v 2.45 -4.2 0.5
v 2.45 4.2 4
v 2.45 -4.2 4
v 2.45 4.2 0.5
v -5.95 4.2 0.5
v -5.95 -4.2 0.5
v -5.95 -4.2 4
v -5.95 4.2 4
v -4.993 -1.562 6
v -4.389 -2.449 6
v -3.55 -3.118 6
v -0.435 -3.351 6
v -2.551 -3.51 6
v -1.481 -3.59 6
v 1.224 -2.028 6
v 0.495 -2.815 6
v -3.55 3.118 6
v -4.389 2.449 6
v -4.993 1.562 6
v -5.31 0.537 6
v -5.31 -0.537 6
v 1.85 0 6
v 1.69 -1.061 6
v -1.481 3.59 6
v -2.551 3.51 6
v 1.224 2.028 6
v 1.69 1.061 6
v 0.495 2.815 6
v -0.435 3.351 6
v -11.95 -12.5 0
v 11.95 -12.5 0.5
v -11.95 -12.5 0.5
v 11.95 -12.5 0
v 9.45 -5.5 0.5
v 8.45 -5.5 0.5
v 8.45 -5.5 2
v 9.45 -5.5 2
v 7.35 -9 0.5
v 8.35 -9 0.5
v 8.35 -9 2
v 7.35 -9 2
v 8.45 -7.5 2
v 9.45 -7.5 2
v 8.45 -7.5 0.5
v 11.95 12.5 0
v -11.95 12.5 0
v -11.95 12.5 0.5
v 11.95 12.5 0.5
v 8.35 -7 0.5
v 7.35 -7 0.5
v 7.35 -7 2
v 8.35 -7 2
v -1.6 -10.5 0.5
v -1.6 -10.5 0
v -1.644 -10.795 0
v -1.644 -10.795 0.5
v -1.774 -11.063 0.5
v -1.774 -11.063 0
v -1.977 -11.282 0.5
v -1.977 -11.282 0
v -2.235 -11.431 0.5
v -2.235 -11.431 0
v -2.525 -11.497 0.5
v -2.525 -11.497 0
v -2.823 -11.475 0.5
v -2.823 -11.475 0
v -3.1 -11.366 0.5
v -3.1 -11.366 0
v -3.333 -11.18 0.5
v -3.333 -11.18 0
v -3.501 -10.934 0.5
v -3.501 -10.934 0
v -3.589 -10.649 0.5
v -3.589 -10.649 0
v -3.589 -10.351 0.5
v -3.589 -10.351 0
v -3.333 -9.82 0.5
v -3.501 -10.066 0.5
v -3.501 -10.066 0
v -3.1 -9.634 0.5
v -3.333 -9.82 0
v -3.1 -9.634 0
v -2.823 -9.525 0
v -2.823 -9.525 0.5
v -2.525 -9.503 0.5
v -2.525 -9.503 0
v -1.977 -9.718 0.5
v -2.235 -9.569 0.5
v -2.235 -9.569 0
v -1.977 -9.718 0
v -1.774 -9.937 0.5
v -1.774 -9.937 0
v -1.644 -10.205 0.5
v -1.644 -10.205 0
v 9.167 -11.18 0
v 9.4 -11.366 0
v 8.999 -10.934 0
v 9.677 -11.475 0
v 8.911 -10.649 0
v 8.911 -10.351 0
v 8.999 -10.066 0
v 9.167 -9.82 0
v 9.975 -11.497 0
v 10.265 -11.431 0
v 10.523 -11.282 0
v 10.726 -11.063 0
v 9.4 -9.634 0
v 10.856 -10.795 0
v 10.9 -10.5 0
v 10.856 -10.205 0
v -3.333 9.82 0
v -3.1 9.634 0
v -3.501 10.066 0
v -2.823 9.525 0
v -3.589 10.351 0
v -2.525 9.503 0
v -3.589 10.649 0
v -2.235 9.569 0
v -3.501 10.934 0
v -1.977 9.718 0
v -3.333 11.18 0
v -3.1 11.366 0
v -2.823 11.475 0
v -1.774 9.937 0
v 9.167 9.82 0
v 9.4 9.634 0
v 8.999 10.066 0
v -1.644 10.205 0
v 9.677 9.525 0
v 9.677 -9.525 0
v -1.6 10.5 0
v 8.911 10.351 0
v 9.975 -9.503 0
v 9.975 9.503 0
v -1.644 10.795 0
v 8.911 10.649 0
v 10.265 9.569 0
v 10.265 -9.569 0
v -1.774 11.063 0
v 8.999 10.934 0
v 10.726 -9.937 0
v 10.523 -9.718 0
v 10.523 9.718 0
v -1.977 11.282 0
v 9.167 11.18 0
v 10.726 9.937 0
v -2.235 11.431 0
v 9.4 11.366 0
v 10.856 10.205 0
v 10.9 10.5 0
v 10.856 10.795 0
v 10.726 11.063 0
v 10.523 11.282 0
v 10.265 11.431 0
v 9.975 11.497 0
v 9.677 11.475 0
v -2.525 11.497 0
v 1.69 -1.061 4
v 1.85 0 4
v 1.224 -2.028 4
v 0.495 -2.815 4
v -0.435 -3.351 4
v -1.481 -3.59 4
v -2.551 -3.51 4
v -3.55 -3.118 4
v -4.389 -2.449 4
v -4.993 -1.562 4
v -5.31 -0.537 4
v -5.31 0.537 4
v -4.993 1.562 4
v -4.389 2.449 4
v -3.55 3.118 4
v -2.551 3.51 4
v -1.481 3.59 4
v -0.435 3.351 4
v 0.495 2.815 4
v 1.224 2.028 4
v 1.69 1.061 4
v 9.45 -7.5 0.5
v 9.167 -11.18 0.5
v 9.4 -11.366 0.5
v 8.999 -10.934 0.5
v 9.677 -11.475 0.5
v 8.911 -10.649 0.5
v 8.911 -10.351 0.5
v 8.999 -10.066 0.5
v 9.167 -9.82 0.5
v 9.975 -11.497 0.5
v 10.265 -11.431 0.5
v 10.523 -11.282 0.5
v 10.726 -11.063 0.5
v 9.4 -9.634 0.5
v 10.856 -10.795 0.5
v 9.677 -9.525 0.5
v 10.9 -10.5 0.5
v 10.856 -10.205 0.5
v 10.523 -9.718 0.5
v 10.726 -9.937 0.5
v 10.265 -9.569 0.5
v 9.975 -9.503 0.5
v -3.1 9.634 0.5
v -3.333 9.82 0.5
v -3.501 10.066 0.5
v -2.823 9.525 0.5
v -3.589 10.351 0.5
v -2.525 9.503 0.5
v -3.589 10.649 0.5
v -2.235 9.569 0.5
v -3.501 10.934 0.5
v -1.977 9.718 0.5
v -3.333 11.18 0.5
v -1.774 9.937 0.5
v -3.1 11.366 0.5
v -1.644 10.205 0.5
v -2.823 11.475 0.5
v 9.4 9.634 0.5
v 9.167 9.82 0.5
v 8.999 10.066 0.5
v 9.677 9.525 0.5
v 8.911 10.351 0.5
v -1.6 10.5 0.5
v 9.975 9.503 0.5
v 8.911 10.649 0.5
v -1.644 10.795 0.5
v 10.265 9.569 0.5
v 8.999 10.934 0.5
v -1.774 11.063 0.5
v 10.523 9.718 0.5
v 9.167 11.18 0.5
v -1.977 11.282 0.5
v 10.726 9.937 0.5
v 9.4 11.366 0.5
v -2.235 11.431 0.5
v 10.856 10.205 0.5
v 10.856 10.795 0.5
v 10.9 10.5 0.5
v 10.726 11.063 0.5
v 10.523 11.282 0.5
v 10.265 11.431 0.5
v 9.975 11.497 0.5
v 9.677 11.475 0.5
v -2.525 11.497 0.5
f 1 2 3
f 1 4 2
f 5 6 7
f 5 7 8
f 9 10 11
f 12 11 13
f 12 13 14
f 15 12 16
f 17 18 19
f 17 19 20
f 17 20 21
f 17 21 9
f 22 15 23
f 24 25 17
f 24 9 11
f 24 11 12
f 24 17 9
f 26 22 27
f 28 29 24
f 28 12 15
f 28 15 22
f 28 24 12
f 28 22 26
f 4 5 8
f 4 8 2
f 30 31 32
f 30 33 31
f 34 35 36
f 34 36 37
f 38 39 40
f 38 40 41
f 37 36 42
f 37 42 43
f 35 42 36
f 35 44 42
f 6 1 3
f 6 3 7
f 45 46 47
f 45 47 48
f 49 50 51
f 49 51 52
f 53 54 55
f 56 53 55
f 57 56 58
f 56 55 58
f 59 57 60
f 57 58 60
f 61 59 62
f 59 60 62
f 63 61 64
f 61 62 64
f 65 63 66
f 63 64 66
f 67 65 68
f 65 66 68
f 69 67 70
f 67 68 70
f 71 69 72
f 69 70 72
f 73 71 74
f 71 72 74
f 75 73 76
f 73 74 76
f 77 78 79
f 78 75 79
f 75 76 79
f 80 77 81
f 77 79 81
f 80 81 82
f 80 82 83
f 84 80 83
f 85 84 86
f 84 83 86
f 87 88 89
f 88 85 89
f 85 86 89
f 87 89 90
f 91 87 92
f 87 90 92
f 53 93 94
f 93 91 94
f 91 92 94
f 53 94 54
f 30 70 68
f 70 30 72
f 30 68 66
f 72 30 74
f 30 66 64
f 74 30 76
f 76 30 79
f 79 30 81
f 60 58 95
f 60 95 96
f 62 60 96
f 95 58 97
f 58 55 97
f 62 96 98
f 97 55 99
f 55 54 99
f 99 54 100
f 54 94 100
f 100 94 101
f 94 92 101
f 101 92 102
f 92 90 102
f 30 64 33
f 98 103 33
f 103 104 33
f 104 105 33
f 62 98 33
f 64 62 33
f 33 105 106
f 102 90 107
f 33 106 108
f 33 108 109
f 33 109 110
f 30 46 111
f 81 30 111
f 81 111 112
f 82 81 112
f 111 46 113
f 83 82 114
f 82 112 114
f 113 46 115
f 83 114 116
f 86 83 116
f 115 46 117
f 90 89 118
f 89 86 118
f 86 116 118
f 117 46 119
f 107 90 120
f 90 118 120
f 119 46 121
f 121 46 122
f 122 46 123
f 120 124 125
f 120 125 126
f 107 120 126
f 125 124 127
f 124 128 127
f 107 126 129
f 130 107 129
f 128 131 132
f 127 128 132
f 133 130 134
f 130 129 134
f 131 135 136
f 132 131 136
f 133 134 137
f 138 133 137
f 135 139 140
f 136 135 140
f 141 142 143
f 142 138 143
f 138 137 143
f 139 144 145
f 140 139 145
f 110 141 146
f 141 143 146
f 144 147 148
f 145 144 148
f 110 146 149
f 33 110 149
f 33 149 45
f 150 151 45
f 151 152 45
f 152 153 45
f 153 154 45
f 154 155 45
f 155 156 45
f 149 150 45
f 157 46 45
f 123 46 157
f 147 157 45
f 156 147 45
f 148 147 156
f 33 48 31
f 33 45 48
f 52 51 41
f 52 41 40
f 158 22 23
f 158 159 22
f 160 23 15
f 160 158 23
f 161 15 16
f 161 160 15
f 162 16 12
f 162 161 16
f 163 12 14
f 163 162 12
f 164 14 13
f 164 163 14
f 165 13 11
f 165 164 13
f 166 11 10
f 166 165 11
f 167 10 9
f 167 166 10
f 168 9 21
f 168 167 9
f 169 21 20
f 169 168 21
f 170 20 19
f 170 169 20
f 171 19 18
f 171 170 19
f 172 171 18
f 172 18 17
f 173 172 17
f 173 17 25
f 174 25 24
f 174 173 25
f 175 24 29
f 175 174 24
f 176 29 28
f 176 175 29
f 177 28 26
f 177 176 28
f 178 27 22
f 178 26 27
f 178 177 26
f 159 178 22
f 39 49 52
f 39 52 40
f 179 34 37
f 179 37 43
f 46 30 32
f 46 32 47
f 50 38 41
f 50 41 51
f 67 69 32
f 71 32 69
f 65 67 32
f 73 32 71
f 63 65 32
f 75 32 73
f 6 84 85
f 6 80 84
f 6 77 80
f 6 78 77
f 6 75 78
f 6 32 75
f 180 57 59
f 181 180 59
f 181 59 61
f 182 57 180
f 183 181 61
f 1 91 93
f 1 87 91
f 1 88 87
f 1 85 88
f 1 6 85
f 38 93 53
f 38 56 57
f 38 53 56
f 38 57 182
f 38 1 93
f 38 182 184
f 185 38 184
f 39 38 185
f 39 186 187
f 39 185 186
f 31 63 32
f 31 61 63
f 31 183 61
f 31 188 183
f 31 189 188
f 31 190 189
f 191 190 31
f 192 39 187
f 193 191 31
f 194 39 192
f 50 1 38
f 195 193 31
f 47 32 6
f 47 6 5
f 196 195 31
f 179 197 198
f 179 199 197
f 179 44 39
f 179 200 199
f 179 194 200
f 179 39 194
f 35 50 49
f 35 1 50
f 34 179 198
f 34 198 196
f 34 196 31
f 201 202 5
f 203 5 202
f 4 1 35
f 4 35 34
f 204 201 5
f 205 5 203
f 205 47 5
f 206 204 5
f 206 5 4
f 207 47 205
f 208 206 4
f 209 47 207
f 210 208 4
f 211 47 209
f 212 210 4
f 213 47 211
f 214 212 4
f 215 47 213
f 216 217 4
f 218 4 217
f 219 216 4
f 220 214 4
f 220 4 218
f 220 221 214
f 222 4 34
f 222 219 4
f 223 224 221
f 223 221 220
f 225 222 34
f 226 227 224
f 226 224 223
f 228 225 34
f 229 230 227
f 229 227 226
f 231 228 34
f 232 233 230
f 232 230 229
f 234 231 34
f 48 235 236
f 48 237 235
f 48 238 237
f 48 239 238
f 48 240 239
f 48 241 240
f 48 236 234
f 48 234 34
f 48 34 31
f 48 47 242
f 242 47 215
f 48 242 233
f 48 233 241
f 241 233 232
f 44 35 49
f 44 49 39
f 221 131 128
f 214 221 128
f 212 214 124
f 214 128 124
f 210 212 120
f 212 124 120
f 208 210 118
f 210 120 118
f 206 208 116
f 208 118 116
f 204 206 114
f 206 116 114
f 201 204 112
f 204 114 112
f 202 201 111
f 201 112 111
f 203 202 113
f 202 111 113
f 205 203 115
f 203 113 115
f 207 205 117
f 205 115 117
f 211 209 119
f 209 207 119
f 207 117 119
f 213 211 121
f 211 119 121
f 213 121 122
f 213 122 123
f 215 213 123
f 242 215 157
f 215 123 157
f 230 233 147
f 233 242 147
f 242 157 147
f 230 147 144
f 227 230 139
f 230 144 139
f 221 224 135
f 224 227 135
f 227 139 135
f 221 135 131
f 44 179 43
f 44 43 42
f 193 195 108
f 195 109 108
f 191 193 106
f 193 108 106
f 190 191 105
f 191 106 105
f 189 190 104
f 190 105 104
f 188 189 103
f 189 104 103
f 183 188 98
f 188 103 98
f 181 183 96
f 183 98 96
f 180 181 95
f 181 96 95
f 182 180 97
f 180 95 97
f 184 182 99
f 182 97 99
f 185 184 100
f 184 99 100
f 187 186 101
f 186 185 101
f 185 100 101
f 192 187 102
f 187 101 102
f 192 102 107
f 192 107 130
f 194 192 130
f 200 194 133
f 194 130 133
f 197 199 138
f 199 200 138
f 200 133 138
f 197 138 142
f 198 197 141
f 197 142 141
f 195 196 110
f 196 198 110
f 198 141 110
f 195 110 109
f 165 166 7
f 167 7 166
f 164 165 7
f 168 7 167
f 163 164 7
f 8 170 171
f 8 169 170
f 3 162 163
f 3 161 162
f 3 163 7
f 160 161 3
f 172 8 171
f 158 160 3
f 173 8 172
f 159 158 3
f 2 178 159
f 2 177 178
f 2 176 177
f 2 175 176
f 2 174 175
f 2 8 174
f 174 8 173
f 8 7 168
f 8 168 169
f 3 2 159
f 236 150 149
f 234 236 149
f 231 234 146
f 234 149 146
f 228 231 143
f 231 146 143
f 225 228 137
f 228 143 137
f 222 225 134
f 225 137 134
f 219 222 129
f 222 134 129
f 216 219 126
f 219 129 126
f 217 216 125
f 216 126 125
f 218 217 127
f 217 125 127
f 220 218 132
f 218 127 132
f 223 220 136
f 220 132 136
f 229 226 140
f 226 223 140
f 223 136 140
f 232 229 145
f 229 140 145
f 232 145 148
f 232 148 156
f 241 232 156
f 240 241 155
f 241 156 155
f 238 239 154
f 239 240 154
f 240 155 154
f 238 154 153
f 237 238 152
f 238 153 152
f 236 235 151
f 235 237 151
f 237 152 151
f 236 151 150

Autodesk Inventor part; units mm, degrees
ref_plane "YZ Plane" through (0, 0, 0) normal (1, 0, 0) x (0, 1, 0)
ref_plane "XZ Plane" through (0, 0, 0) normal (0, 1, 0) x (-1, 0, 0)
ref_plane "XY Plane" through (0, 0, 0) normal (0, 0, 1) x (1, 0, 0)
sketch "Sketch1" plane through (0, 0, 0) normal (0, 0, 1) x (1, 0, 0)
  line L0 (-11.95, 12.5) -> (11.95, 12.5)
  line L1 (11.95, 12.5) -> (11.95, -12.5)
  line L2 (11.95, -12.5) -> (-11.95, -12.5)
  line L3 (-11.95, -12.5) -> (-11.95, 12.5)
  line L4 (-11.95, 12.5) -> (11.95, -12.5) construction
  line L5 (11.95, 12.5) -> (-11.95, -12.5) construction
  circle A0 centre (9.9, -10.5) radius 1
  circle A1 centre (-2.6, -10.5) radius 1
  line L6 (11.5332, -10.5) -> (-16.0268, -10.5) construction
  line L7 (9.9, -13.3661) -> (9.9, 11.2852) construction
  line L8 (11.2708, 10.5) -> (-4.8598, 10.5) construction
  circle A2 centre (9.9, 10.5) radius 1
  line L9 (-2.6, -15.3332) -> (-2.6, 11.9823) construction
  circle A3 centre (-2.6, 10.5) radius 1
  point P0 (0, 0)
  dimension "d0" = 23.9
  dimension "d1" = 25
  dimension "d2" = 2
  dimension "d3" = 21.85
  dimension "d5" = 2
  dimension "d6" = 9.35
  dimension "d7" = 2
  dimension "d8" = 23
  dimension "d9" = 2
  dimension "d10" = 2
extrude "Extrusion1" add sketch "Sketch1" along normal blind 0.5
sketch "Sketch2" plane through (0, 0, 0.5) normal (0, 0, 1) x (1, 0, 0)
  line L0 (-16.73, 0) -> (16.73, 0) construction
  line L1 (-5.95, 4.2) -> (2.45, 4.2)
  line L2 (2.45, 4.2) -> (2.45, -4.2)
  line L3 (2.45, -4.2) -> (-5.95, -4.2)
  line L4 (-5.95, -4.2) -> (-5.95, 4.2)
  line L5 (-5.95, 4.2) -> (2.45, -4.2) construction
  line L6 (2.45, 4.2) -> (-5.95, -4.2) construction
  line L7 (-11.95, 12.5) -> (-11.95, -12.5) projected
  point P0 (0, 0)
  point P1 (-1.75, 0)
  dimension "d13" = 8.4
  dimension "d14" = 8.4
  dimension "d15" = 6
extrude "Extrusion2" add sketch "Sketch2" along normal blind 3.5
sketch "Sketch3" plane through (0, 0, 4) normal (0, 0, 1) x (1, 0, 0)
  line L0 (-5.95, 4.2) -> (2.45, 4.2) construction
  line L1 (-5.95, 4.2) -> (2.45, -4.2) construction
  line L2 (-5.95, -4.2) -> (2.45, -4.2) construction
  line L3 (2.45, 4.2) -> (-5.95, -4.2) construction
  circle A0 centre (-1.75, 0) radius 3.6
  point P0 (0, 0)
  dimension "d18" = 7.2
extrude "Extrusion3" add sketch "Sketch3" along normal blind 2
sketch "Sketch4" plane through (0, 0, 0.5) normal (0, 0, 1) x (1, 0, 0)
  line L0 (7.35, -7) -> (8.35, -7)
  line L1 (8.35, -7) -> (8.35, -9)
  line L2 (8.35, -9) -> (7.35, -9)
  line L3 (7.35, -9) -> (7.35, -7)
  line L4 (8.45, -5.5) -> (9.45, -5.5)
  line L5 (9.45, -5.5) -> (9.45, -7.5)
  line L6 (9.45, -7.5) -> (8.45, -7.5)
  line L7 (8.45, -7.5) -> (8.45, -5.5)
  line L8 (-11.95, -12.5) -> (11.95, -12.5) projected
  line L9 (11.95, -12.5) -> (11.95, 12.5) projected
  point P0 (0, 0)
  dimension "d21" = 3.5
  dimension "d22" = 1
  dimension "d23" = 2
  dimension "d25" = 2.5
  dimension "d26" = 1
  dimension "d27" = 2
  dimension "d28" = 5
  dimension "d31" = 0.1
extrude "Extrusion4" add sketch "Sketch4" along normal blind 1.5
properties part number "Board"
